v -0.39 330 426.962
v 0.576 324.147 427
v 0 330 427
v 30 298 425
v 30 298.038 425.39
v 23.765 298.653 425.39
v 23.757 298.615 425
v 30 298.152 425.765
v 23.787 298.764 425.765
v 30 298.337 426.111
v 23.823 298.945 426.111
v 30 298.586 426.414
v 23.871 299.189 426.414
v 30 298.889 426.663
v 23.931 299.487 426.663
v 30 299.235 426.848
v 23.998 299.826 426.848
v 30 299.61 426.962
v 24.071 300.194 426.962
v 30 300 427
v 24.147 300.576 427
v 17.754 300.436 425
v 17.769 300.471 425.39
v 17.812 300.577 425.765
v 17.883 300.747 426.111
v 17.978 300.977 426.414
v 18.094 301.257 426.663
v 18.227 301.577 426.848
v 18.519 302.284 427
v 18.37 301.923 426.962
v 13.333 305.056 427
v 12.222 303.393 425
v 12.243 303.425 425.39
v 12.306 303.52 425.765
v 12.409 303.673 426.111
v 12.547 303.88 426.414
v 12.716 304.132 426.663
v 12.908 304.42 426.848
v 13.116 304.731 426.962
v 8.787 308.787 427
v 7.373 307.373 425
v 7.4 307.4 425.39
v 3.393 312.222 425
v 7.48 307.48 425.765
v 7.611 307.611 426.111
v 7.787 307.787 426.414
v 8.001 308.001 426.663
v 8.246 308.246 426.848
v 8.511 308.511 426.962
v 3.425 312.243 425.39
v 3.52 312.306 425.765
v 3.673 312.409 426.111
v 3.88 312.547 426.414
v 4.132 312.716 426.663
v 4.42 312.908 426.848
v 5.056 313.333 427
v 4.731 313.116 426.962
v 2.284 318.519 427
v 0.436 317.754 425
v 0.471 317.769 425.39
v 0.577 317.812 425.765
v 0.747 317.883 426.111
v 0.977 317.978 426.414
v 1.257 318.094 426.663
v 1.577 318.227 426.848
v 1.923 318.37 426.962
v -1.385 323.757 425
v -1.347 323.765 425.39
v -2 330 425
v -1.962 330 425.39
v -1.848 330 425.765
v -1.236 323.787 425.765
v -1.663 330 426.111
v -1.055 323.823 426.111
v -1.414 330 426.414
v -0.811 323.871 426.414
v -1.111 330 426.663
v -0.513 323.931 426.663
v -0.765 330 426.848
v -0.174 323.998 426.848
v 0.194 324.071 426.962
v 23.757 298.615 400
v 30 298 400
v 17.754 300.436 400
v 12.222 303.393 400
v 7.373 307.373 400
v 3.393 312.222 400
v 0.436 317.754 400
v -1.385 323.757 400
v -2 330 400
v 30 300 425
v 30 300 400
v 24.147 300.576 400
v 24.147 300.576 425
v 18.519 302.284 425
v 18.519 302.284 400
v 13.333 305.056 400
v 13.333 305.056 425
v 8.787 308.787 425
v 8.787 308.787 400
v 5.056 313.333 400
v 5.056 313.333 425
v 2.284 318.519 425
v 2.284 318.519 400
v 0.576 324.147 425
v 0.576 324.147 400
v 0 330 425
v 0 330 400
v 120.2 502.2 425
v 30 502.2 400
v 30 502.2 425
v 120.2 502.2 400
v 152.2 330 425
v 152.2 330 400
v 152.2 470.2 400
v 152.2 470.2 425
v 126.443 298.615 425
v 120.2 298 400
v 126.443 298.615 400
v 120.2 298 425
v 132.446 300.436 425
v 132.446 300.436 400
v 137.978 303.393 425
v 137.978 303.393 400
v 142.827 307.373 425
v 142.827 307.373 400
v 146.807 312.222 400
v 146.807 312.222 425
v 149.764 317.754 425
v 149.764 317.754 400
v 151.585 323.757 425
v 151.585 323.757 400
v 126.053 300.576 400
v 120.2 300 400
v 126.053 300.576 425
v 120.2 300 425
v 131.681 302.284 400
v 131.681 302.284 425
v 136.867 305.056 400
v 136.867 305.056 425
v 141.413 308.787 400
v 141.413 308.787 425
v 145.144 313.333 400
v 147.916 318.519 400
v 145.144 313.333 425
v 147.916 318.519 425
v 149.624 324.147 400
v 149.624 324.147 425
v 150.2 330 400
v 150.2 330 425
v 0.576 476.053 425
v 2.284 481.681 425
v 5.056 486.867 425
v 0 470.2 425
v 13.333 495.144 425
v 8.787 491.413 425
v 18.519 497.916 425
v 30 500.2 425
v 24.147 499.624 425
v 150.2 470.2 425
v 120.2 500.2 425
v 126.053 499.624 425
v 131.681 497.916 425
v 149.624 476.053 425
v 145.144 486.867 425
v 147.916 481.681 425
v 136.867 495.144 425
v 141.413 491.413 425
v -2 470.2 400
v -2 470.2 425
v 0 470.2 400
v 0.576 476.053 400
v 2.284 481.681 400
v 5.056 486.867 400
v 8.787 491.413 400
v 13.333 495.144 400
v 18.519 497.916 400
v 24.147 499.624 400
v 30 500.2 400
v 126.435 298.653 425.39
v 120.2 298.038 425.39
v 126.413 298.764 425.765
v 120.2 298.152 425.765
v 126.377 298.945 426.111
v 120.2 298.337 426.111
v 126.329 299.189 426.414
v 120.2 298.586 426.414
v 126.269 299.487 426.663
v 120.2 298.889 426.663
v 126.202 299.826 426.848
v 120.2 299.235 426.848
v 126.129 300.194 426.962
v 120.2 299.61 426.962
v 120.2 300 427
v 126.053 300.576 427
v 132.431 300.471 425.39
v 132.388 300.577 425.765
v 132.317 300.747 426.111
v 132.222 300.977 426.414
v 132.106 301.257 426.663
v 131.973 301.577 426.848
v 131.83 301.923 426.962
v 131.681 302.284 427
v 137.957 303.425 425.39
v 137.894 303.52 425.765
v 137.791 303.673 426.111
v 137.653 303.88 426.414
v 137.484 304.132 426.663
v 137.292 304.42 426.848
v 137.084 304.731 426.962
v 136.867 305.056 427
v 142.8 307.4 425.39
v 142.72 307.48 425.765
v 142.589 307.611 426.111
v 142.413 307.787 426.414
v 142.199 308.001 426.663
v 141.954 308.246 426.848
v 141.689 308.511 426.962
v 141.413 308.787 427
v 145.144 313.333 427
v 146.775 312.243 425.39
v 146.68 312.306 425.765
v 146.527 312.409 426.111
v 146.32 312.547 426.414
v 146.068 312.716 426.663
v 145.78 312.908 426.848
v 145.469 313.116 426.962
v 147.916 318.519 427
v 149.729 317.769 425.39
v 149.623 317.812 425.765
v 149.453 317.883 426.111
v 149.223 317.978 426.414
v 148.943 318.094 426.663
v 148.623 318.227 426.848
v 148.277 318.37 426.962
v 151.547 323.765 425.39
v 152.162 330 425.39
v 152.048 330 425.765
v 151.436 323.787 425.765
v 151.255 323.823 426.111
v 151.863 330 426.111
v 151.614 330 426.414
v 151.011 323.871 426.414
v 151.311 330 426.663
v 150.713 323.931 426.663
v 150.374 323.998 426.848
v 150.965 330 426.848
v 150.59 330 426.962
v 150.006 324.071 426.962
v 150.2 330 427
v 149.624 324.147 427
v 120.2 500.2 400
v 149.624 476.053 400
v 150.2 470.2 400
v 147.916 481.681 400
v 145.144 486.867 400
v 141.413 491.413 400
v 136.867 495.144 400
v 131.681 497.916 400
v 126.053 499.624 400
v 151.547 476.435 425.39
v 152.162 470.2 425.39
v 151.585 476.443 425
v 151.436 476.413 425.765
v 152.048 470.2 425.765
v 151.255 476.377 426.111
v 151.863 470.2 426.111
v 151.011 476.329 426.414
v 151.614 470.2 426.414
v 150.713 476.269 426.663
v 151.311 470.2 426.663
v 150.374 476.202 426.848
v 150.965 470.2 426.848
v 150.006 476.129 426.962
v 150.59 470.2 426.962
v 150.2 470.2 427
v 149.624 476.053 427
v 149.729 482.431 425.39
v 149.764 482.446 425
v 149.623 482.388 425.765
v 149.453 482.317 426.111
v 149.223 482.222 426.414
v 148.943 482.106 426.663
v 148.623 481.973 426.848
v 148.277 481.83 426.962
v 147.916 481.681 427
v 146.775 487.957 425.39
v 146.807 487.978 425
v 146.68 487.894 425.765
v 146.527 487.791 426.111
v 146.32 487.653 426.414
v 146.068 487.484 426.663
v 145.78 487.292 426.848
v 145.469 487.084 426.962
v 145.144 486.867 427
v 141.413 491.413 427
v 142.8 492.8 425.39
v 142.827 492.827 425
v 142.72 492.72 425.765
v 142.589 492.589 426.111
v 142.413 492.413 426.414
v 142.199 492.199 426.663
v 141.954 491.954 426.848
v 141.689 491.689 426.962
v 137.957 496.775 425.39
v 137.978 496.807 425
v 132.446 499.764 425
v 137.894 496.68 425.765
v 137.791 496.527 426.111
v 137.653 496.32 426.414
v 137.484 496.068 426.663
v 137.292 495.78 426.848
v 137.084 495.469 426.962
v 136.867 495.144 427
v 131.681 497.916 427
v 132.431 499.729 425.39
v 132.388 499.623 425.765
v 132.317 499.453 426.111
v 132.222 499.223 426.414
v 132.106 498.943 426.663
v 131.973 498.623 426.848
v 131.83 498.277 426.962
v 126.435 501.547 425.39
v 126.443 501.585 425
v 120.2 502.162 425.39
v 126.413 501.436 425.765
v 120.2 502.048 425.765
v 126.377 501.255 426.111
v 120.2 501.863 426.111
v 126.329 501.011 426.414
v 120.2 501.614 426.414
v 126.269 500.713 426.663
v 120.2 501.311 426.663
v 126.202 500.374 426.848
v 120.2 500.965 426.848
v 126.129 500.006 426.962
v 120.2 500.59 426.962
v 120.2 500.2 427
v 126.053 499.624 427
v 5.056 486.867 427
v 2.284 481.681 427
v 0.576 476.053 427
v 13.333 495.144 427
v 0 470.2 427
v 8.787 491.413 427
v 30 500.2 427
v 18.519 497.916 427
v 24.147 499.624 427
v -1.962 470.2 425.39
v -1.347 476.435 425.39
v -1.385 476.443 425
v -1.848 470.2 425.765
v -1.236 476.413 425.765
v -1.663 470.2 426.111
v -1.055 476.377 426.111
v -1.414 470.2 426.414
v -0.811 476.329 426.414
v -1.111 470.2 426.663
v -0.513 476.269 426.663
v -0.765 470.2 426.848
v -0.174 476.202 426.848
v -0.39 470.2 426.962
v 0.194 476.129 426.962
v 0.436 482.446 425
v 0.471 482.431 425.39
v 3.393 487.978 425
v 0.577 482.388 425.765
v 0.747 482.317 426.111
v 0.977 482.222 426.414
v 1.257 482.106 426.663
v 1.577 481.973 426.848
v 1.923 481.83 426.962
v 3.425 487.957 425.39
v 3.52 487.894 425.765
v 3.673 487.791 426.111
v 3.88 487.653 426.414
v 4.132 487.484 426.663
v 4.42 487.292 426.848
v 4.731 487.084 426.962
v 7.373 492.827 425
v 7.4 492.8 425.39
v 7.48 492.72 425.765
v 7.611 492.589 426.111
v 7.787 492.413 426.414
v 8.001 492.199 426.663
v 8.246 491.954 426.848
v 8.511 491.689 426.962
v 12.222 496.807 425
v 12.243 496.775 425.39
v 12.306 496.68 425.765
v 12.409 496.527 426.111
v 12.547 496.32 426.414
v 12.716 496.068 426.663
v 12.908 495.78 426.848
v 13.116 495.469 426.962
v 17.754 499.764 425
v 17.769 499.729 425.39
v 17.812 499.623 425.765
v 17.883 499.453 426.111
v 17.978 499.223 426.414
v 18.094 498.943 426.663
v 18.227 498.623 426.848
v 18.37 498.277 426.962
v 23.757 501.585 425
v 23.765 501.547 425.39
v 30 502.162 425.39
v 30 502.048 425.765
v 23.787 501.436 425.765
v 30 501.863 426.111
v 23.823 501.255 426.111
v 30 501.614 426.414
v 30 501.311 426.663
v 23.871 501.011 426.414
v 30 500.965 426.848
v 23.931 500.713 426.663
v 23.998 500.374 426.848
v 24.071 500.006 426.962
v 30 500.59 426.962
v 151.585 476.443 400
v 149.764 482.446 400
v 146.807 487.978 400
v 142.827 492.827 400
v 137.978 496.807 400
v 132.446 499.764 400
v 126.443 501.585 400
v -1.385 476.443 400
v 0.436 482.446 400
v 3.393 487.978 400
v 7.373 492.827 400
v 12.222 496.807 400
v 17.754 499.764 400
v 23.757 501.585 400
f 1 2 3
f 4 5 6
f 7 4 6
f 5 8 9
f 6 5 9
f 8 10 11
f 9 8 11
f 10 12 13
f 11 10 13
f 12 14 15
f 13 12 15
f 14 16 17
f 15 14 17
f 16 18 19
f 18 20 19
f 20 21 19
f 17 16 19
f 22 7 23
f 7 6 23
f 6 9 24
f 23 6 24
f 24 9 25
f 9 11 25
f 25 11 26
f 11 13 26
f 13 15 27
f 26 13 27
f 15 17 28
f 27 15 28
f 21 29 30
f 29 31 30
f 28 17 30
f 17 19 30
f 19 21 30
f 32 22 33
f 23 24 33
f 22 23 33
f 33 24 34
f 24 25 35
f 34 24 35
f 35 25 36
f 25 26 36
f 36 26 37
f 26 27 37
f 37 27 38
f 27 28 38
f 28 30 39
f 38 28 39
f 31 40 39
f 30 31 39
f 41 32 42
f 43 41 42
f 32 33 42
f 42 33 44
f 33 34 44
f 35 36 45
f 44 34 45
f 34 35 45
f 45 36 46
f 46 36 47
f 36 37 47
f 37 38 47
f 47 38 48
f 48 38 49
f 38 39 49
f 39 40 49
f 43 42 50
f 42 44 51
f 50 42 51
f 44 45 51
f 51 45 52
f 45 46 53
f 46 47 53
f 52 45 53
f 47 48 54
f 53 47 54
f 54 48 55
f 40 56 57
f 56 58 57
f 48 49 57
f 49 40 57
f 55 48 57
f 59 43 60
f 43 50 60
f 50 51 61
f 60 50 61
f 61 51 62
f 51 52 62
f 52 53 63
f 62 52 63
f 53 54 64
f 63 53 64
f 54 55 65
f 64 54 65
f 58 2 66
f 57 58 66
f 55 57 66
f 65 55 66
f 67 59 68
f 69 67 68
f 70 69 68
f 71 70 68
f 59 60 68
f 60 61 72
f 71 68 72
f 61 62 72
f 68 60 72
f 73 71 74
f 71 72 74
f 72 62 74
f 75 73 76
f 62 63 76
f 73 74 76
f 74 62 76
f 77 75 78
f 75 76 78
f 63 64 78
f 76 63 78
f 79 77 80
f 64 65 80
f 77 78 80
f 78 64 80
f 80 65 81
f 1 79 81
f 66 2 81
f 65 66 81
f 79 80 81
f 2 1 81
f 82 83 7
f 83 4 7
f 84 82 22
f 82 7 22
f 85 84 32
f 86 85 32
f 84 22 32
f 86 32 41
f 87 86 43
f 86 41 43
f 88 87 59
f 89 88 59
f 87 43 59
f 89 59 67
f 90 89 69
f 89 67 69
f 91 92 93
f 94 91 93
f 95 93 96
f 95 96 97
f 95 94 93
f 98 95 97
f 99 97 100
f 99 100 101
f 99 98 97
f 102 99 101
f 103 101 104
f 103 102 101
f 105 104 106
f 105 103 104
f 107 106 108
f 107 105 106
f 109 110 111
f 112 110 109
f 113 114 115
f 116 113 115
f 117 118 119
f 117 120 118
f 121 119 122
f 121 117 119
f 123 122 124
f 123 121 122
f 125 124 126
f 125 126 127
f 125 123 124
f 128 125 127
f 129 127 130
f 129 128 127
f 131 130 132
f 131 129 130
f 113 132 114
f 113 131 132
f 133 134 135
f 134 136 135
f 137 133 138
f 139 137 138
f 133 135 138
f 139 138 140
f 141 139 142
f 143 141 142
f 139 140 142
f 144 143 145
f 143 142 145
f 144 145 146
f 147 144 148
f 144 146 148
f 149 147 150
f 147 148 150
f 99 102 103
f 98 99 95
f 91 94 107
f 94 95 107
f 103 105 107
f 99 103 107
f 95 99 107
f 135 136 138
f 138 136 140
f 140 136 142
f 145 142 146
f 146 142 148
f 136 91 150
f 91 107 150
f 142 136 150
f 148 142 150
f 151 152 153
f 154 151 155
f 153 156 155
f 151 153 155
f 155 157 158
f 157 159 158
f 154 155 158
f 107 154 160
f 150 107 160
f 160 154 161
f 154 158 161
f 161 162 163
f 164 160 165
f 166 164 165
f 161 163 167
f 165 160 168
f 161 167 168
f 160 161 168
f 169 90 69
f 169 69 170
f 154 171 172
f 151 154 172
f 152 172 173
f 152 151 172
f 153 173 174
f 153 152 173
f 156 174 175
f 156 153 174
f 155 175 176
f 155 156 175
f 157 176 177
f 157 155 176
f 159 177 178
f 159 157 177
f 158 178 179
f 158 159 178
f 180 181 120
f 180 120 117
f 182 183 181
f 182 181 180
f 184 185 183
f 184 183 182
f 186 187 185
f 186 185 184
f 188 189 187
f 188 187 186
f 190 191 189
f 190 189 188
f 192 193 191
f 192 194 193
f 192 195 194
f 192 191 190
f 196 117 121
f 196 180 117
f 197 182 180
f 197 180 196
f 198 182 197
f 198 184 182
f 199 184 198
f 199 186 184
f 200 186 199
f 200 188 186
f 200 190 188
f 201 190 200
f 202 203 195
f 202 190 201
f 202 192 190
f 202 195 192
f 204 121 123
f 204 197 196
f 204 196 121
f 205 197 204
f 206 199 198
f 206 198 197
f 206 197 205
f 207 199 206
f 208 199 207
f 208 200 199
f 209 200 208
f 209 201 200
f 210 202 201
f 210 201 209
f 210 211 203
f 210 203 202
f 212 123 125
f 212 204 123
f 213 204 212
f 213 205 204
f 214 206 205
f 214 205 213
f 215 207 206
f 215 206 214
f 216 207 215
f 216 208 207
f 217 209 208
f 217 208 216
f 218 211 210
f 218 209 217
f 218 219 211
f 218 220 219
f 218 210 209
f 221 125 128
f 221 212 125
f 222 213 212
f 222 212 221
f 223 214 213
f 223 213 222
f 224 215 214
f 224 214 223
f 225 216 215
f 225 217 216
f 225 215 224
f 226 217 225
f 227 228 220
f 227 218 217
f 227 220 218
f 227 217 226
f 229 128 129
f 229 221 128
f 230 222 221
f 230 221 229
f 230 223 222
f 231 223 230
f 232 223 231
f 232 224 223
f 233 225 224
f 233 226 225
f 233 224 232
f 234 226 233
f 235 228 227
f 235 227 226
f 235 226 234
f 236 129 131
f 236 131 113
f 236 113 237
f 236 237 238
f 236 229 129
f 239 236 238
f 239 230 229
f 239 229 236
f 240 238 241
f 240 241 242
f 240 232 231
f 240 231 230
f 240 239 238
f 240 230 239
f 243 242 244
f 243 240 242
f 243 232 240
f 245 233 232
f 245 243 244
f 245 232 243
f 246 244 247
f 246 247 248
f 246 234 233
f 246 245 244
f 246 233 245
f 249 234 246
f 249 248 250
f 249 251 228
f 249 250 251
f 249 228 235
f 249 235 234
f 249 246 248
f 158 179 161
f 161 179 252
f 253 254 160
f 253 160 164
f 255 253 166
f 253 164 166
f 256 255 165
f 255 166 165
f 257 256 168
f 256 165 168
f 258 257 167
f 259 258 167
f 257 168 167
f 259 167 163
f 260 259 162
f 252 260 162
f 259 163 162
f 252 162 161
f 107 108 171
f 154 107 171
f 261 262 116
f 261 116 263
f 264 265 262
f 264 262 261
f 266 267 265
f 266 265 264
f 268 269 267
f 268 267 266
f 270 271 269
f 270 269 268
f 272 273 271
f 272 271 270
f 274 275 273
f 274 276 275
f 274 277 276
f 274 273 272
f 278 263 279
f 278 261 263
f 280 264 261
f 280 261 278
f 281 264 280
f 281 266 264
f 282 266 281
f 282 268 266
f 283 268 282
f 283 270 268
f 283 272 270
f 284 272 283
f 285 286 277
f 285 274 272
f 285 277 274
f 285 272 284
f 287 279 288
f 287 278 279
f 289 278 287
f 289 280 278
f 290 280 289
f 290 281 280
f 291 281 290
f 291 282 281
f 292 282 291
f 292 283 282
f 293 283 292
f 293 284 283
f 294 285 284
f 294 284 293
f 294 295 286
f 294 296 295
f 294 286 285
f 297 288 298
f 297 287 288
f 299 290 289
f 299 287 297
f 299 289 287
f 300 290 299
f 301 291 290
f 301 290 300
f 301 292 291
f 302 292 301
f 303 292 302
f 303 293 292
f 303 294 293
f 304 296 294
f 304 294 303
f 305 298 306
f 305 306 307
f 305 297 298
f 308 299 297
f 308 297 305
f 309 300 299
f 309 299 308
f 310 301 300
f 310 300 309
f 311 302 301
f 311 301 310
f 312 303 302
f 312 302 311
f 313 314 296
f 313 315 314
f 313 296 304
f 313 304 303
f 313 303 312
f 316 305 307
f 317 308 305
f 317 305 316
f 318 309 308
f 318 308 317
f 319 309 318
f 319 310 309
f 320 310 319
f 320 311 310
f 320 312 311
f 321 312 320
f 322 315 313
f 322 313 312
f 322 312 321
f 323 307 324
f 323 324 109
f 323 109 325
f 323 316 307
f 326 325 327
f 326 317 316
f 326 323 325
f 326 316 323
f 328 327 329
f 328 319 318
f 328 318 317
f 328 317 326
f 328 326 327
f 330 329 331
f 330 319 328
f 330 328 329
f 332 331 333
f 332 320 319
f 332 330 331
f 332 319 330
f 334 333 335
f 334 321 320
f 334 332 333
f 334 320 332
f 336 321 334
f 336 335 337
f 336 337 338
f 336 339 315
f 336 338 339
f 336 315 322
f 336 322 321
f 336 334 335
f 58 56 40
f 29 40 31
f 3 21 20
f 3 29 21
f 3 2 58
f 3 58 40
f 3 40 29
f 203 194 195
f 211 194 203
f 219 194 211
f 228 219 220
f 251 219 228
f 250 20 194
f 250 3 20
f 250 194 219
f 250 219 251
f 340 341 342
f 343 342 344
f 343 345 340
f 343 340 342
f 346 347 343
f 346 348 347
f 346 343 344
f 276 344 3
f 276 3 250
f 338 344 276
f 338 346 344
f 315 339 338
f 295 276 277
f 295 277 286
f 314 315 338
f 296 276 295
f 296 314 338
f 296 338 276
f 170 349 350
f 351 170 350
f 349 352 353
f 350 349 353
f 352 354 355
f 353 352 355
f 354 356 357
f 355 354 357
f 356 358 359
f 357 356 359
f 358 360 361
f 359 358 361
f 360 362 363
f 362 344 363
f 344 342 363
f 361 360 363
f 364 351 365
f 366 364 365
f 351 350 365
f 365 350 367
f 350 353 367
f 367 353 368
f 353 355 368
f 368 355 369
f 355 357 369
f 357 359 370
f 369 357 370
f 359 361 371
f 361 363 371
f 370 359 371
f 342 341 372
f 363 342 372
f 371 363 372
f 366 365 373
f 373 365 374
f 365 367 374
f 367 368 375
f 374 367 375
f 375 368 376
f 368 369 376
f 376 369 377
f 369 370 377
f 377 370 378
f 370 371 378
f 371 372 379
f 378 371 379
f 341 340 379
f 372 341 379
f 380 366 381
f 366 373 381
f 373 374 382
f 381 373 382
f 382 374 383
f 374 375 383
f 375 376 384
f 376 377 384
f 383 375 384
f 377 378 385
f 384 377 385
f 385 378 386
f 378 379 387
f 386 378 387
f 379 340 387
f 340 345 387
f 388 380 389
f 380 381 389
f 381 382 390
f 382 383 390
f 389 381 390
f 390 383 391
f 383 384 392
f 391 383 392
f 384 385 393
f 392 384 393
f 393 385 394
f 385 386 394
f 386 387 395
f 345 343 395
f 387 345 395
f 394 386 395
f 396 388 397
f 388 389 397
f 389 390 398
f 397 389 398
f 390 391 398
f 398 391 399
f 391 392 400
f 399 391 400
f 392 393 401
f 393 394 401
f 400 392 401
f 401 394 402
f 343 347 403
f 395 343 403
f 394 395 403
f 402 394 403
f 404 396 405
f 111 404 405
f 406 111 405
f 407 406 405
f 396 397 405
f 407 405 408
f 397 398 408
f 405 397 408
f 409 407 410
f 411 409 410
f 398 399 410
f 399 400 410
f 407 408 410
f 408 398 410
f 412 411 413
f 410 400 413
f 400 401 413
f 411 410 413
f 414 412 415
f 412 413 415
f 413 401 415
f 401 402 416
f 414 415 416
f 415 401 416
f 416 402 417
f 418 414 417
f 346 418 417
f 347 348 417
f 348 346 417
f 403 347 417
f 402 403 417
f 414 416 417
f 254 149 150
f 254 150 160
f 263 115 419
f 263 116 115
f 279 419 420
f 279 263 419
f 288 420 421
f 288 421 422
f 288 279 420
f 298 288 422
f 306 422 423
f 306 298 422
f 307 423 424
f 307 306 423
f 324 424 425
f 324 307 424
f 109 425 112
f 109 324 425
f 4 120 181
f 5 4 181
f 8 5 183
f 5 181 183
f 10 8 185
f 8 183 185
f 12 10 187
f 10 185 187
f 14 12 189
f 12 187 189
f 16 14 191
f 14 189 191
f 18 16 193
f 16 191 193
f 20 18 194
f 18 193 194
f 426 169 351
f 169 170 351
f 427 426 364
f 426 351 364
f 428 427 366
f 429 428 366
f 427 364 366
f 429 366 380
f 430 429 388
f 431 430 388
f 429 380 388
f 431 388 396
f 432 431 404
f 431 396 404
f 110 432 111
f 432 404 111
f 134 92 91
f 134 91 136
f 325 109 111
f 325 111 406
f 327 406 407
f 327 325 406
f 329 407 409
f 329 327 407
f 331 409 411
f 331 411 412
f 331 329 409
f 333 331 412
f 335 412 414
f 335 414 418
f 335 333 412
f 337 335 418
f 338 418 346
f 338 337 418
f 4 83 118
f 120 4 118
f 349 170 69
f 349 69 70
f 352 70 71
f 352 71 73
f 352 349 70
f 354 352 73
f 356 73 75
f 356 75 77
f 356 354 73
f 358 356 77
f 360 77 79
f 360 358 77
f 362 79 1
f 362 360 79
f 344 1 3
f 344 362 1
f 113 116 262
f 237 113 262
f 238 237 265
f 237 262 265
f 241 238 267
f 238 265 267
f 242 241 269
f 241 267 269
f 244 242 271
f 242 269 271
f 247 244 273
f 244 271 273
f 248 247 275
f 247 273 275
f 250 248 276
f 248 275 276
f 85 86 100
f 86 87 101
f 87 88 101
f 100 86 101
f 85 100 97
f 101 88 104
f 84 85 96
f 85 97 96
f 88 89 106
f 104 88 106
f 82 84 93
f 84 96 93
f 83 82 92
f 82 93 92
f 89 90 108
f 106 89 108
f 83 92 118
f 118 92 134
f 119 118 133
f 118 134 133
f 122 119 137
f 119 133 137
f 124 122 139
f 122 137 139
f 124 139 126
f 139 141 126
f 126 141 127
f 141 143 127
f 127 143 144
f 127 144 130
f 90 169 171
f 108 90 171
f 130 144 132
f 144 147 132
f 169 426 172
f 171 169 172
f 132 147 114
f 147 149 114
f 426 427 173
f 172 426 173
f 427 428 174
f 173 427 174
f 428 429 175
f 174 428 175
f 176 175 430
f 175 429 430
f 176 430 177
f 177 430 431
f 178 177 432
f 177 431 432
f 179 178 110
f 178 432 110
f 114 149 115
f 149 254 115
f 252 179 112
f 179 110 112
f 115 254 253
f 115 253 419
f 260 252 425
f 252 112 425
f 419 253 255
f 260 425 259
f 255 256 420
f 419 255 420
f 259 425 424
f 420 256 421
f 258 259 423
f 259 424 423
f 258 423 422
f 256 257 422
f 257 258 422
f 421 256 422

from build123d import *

# Parameters (mm, degrees)
BOX036_W       = 150.2
BOX036_H       = 200.2
BOX036_DEPTH   = 25
FILLET022_R    = 30
FILLET023_R    = 30
FILLET024_R    = 30
FILLET025_R    = 30
THICKNESS001_T = 2


with BuildPart() as part:
    # Box036 → Box036 (new body)
    with BuildSketch(Plane.XY):
        with Locations((75.1, 100.1)):
            Rectangle(BOX036_W, BOX036_H)
    extrude(amount=BOX036_DEPTH)

    # Fillet022
    fillet022_edges = [part.edges().sort_by_distance(p)[0] for p in [
        (150.2, 0, 12.5),
    ]]
    fillet(fillet022_edges, radius=FILLET022_R)

    # Fillet023
    fillet023_edges = [part.edges().sort_by_distance(p)[0] for p in [
        (150.2, 200.2, 12.5),
    ]]
    fillet(fillet023_edges, radius=FILLET023_R)

    # Fillet024
    fillet024_edges = [part.edges().sort_by_distance(p)[0] for p in [
        (0, 0, 12.5),
    ]]
    fillet(fillet024_edges, radius=FILLET024_R)

    # Fillet025
    fillet025_edges = [part.edges().sort_by_distance(p)[0] for p in [
        (0, 200.2, 12.5),
    ]]
    fillet(fillet025_edges, radius=FILLET025_R)

    # Thickness001
    thickness001_openings = [part.faces().sort_by_distance(p)[0] for p in [
        (75.1, 100.1, 0),
    ]]
    offset(amount=THICKNESS001_T, openings=thickness001_openings)


with BuildPart() as part_1:
    # Thickness001 placement: moved
    add(part.part.moved(Location((0, 300, 400))))


solid = part_1.part
